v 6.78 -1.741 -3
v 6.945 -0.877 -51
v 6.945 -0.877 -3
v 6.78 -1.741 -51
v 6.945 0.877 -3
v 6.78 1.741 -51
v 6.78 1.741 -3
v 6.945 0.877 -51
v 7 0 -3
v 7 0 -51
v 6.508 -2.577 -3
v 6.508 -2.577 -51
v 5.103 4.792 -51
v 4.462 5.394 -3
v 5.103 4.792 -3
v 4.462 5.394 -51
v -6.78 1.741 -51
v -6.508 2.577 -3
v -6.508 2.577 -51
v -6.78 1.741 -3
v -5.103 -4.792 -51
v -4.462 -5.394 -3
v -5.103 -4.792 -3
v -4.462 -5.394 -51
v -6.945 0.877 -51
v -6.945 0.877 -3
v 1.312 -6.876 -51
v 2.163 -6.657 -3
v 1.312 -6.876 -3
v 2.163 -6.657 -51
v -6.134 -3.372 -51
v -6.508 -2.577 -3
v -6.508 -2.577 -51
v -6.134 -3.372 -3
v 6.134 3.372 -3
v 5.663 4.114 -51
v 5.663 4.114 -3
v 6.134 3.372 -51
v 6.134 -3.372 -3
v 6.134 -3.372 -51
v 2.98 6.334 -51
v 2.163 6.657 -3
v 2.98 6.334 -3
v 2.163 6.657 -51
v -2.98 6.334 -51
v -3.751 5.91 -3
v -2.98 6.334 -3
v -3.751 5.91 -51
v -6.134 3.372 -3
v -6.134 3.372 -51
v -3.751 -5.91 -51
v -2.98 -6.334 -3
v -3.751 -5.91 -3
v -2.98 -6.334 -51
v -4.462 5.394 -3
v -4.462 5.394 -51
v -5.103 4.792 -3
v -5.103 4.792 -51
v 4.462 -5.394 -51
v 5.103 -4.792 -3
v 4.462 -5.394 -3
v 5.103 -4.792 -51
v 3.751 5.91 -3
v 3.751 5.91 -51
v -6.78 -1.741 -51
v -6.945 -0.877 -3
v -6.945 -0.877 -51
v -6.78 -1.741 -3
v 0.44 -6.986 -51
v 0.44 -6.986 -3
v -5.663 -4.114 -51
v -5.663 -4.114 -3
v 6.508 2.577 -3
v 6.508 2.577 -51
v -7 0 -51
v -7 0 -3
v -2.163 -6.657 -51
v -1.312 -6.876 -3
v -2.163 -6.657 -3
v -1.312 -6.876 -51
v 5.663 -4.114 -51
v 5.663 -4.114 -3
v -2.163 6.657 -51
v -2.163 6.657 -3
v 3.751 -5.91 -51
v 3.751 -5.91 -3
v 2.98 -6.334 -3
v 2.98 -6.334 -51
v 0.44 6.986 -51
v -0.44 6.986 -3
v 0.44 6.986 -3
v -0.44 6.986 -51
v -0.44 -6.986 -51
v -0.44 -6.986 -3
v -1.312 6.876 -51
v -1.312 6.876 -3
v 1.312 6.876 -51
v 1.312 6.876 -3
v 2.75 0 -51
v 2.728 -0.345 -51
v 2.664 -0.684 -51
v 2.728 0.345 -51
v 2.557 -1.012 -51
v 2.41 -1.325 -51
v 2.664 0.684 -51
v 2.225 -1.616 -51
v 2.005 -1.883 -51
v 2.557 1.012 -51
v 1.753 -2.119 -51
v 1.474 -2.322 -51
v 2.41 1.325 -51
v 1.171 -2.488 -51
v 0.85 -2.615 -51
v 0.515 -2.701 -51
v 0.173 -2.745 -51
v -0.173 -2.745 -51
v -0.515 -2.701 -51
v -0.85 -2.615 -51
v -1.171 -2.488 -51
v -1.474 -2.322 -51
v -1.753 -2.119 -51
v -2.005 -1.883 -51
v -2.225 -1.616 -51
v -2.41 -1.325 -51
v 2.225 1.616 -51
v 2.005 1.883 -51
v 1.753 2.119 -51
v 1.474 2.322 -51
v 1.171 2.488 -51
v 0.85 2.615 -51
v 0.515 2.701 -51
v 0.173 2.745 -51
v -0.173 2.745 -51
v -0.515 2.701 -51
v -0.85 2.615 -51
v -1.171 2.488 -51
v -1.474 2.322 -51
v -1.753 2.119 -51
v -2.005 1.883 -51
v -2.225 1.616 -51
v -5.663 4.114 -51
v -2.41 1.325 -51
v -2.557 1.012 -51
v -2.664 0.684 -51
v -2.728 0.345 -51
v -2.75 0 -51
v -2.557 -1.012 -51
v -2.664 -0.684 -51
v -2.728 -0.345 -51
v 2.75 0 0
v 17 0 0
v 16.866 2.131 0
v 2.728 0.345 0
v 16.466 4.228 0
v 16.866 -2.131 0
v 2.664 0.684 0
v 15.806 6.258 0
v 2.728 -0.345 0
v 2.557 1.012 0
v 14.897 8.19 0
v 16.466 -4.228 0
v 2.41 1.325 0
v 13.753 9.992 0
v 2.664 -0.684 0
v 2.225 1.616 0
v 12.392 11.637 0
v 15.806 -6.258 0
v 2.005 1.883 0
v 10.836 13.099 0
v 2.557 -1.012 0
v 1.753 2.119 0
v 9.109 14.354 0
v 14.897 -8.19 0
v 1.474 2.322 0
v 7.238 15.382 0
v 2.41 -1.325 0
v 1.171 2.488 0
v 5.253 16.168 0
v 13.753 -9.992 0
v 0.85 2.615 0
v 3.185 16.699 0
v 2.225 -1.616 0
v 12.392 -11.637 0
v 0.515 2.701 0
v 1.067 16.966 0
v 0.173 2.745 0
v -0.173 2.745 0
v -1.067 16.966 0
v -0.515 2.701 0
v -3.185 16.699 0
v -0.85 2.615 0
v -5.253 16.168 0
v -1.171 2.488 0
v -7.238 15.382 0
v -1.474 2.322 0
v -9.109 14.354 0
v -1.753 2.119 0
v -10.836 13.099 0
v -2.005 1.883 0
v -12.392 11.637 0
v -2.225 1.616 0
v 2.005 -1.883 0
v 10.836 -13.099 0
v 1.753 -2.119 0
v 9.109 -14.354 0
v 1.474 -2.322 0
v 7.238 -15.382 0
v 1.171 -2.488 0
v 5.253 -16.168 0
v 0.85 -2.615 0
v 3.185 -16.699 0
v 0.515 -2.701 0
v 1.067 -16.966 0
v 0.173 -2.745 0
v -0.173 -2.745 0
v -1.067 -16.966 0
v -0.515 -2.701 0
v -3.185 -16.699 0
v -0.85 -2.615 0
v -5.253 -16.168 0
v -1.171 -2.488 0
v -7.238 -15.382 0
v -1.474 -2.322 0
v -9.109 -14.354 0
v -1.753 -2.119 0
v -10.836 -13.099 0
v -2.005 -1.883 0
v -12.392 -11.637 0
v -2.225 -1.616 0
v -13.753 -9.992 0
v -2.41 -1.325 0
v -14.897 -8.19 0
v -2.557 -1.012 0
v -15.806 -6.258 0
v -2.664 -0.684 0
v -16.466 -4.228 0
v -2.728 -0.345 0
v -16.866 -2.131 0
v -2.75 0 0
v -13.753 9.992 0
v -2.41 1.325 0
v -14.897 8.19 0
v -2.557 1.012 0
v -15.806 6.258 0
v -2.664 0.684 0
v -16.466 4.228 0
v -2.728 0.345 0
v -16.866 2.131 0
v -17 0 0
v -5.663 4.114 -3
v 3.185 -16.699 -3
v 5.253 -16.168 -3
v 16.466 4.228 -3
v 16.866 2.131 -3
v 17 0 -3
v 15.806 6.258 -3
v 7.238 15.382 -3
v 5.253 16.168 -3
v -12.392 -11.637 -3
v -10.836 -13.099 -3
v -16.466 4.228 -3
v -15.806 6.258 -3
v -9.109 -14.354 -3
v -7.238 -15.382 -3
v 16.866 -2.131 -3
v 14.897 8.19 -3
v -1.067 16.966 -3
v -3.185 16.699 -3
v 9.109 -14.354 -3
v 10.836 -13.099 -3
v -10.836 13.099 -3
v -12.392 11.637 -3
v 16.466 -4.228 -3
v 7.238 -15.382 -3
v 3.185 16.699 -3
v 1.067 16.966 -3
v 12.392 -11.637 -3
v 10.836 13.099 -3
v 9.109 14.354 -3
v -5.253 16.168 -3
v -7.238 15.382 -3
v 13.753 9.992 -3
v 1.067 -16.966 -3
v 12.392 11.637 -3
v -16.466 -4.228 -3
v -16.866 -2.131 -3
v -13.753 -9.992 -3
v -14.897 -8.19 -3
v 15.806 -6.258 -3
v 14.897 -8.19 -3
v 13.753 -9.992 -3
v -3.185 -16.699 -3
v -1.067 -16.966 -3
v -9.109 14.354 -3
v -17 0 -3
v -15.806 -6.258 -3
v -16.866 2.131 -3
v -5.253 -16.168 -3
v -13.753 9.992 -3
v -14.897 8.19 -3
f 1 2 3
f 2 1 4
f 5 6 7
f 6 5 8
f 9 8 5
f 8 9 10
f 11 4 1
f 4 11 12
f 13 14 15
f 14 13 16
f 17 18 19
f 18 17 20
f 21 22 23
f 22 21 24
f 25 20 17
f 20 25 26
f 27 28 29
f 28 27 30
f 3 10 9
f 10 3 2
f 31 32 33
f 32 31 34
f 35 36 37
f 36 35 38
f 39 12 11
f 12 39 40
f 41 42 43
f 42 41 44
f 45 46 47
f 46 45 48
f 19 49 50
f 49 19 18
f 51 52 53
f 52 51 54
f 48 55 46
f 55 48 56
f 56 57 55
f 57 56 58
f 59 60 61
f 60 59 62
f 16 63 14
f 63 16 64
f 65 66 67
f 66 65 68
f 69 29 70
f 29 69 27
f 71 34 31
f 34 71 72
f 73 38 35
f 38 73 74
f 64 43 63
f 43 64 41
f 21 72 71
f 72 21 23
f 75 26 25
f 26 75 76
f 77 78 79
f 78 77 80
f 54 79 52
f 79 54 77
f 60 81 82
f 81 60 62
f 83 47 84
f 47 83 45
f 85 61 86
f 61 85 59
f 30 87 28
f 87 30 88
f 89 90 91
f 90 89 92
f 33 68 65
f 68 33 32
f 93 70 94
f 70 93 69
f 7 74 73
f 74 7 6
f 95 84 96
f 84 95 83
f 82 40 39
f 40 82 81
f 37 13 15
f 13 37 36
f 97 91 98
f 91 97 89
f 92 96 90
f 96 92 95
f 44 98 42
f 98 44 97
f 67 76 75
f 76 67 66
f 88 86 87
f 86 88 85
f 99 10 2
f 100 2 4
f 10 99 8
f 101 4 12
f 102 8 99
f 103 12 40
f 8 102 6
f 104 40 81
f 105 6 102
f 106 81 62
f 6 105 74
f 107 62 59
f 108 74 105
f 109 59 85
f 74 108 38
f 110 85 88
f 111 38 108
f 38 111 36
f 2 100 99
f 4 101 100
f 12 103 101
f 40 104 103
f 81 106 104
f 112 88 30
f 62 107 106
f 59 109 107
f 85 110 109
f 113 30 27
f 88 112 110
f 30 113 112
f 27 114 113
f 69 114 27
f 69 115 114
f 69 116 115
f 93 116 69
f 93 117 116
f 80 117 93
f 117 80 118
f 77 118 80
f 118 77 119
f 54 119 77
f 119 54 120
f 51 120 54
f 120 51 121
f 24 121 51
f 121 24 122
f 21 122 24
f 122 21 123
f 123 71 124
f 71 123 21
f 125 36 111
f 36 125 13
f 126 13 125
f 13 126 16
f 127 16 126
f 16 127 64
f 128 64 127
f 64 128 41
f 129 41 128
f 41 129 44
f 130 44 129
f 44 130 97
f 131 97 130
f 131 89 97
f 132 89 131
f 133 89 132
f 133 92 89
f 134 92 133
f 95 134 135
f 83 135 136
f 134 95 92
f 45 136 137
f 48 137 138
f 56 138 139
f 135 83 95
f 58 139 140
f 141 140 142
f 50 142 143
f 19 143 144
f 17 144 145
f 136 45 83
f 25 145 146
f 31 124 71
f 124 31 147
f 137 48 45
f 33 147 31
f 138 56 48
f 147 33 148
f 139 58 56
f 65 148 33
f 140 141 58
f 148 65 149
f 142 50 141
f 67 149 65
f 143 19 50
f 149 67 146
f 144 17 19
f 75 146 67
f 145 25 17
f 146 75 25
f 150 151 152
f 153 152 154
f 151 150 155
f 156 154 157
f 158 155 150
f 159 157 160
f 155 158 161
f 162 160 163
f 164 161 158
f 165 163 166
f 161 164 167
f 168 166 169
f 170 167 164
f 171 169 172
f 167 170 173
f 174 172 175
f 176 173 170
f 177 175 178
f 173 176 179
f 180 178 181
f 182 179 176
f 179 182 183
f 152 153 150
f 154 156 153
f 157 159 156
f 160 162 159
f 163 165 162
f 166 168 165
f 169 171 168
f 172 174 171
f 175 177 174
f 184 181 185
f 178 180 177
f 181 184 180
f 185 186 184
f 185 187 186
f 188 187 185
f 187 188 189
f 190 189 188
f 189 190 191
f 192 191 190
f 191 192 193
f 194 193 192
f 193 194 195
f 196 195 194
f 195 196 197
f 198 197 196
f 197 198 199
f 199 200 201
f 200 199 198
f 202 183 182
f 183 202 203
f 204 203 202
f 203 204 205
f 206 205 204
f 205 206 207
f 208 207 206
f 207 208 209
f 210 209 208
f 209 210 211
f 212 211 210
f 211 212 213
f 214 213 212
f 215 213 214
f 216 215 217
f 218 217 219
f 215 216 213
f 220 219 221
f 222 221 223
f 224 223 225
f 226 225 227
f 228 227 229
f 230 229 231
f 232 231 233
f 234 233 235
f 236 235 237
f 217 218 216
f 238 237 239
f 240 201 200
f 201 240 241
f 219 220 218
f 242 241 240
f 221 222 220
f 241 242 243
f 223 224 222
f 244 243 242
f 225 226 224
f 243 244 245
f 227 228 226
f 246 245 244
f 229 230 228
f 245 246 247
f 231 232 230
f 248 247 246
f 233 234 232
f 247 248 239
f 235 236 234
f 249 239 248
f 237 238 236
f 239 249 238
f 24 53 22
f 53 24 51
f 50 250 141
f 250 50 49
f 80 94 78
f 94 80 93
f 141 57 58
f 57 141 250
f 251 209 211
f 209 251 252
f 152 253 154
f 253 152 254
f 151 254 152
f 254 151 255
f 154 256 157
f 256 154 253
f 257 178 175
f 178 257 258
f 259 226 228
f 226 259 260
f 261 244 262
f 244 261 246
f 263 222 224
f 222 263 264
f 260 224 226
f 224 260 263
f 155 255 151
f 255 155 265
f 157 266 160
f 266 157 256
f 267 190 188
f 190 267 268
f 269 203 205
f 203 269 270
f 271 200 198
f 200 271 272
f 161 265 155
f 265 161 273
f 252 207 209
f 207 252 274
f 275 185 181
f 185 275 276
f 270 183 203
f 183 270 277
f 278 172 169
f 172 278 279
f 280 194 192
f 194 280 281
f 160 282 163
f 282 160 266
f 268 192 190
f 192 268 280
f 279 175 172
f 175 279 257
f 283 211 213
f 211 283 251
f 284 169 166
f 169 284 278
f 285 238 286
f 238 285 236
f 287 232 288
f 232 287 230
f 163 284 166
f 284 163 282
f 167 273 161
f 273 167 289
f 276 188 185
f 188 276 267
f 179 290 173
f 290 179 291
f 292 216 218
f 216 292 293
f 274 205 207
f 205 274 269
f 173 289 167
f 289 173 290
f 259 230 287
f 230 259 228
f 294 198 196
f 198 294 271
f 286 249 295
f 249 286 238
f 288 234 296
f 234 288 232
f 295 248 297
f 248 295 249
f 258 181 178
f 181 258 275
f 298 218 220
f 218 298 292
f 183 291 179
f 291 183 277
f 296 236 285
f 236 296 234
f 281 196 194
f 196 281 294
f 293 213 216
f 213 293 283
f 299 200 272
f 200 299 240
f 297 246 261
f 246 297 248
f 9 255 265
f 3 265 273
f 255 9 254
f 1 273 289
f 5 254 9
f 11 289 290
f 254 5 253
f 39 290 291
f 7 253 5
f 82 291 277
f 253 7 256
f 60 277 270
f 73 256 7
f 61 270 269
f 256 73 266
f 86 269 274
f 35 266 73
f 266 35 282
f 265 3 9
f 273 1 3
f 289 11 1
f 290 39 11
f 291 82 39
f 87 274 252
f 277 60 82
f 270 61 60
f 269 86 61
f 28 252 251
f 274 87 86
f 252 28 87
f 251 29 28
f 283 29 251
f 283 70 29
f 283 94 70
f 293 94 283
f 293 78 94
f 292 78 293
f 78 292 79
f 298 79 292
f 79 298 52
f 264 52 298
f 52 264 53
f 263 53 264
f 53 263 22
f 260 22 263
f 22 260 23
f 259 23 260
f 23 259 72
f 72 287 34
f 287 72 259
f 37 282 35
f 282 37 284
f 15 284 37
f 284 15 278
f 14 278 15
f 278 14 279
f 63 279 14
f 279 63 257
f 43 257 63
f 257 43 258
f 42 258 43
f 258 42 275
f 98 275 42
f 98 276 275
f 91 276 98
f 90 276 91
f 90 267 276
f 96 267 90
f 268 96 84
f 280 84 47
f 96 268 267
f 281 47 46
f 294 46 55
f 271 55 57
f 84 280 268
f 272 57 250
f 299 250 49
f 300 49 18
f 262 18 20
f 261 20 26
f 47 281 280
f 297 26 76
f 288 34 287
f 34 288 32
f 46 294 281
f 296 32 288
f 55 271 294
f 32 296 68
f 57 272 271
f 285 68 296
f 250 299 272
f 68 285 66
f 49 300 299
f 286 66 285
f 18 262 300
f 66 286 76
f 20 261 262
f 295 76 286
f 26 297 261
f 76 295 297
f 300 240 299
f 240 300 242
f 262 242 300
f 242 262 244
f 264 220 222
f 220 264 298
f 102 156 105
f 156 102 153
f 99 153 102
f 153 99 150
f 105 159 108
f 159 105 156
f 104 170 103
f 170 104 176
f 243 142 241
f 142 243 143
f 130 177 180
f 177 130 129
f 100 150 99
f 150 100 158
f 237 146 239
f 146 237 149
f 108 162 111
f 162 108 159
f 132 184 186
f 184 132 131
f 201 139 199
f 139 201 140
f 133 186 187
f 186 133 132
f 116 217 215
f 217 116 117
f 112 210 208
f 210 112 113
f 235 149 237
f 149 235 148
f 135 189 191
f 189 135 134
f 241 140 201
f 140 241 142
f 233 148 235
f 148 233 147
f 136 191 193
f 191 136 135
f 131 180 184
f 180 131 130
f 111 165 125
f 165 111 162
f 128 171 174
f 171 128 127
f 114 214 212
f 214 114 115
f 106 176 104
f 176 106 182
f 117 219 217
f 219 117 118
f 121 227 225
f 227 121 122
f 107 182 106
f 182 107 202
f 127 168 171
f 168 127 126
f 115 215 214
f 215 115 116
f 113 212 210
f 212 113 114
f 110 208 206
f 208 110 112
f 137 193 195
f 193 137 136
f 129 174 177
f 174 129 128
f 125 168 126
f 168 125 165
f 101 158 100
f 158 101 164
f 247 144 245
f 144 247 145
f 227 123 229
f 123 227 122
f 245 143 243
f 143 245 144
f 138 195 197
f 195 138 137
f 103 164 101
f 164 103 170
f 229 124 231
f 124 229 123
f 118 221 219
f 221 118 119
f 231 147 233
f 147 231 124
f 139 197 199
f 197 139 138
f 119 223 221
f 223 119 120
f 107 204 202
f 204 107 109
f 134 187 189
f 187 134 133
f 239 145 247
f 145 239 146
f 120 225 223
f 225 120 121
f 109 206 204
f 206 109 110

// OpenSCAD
$fn = 50;


difference() {
	union() {
		translate(v = [0, 0, -51.0000000000]) {
			cylinder(h = 51, r = 7.0000000000);
		}
		translate(v = [0, 0, -3.0000000000]) {
			cylinder(h = 3, r = 17.0000000000);
		}
	}
	union() {
		#translate(v = [0, 0, -51]) {
			cylinder(h = 51, r = 2.7500000000);
		}
	}
}
